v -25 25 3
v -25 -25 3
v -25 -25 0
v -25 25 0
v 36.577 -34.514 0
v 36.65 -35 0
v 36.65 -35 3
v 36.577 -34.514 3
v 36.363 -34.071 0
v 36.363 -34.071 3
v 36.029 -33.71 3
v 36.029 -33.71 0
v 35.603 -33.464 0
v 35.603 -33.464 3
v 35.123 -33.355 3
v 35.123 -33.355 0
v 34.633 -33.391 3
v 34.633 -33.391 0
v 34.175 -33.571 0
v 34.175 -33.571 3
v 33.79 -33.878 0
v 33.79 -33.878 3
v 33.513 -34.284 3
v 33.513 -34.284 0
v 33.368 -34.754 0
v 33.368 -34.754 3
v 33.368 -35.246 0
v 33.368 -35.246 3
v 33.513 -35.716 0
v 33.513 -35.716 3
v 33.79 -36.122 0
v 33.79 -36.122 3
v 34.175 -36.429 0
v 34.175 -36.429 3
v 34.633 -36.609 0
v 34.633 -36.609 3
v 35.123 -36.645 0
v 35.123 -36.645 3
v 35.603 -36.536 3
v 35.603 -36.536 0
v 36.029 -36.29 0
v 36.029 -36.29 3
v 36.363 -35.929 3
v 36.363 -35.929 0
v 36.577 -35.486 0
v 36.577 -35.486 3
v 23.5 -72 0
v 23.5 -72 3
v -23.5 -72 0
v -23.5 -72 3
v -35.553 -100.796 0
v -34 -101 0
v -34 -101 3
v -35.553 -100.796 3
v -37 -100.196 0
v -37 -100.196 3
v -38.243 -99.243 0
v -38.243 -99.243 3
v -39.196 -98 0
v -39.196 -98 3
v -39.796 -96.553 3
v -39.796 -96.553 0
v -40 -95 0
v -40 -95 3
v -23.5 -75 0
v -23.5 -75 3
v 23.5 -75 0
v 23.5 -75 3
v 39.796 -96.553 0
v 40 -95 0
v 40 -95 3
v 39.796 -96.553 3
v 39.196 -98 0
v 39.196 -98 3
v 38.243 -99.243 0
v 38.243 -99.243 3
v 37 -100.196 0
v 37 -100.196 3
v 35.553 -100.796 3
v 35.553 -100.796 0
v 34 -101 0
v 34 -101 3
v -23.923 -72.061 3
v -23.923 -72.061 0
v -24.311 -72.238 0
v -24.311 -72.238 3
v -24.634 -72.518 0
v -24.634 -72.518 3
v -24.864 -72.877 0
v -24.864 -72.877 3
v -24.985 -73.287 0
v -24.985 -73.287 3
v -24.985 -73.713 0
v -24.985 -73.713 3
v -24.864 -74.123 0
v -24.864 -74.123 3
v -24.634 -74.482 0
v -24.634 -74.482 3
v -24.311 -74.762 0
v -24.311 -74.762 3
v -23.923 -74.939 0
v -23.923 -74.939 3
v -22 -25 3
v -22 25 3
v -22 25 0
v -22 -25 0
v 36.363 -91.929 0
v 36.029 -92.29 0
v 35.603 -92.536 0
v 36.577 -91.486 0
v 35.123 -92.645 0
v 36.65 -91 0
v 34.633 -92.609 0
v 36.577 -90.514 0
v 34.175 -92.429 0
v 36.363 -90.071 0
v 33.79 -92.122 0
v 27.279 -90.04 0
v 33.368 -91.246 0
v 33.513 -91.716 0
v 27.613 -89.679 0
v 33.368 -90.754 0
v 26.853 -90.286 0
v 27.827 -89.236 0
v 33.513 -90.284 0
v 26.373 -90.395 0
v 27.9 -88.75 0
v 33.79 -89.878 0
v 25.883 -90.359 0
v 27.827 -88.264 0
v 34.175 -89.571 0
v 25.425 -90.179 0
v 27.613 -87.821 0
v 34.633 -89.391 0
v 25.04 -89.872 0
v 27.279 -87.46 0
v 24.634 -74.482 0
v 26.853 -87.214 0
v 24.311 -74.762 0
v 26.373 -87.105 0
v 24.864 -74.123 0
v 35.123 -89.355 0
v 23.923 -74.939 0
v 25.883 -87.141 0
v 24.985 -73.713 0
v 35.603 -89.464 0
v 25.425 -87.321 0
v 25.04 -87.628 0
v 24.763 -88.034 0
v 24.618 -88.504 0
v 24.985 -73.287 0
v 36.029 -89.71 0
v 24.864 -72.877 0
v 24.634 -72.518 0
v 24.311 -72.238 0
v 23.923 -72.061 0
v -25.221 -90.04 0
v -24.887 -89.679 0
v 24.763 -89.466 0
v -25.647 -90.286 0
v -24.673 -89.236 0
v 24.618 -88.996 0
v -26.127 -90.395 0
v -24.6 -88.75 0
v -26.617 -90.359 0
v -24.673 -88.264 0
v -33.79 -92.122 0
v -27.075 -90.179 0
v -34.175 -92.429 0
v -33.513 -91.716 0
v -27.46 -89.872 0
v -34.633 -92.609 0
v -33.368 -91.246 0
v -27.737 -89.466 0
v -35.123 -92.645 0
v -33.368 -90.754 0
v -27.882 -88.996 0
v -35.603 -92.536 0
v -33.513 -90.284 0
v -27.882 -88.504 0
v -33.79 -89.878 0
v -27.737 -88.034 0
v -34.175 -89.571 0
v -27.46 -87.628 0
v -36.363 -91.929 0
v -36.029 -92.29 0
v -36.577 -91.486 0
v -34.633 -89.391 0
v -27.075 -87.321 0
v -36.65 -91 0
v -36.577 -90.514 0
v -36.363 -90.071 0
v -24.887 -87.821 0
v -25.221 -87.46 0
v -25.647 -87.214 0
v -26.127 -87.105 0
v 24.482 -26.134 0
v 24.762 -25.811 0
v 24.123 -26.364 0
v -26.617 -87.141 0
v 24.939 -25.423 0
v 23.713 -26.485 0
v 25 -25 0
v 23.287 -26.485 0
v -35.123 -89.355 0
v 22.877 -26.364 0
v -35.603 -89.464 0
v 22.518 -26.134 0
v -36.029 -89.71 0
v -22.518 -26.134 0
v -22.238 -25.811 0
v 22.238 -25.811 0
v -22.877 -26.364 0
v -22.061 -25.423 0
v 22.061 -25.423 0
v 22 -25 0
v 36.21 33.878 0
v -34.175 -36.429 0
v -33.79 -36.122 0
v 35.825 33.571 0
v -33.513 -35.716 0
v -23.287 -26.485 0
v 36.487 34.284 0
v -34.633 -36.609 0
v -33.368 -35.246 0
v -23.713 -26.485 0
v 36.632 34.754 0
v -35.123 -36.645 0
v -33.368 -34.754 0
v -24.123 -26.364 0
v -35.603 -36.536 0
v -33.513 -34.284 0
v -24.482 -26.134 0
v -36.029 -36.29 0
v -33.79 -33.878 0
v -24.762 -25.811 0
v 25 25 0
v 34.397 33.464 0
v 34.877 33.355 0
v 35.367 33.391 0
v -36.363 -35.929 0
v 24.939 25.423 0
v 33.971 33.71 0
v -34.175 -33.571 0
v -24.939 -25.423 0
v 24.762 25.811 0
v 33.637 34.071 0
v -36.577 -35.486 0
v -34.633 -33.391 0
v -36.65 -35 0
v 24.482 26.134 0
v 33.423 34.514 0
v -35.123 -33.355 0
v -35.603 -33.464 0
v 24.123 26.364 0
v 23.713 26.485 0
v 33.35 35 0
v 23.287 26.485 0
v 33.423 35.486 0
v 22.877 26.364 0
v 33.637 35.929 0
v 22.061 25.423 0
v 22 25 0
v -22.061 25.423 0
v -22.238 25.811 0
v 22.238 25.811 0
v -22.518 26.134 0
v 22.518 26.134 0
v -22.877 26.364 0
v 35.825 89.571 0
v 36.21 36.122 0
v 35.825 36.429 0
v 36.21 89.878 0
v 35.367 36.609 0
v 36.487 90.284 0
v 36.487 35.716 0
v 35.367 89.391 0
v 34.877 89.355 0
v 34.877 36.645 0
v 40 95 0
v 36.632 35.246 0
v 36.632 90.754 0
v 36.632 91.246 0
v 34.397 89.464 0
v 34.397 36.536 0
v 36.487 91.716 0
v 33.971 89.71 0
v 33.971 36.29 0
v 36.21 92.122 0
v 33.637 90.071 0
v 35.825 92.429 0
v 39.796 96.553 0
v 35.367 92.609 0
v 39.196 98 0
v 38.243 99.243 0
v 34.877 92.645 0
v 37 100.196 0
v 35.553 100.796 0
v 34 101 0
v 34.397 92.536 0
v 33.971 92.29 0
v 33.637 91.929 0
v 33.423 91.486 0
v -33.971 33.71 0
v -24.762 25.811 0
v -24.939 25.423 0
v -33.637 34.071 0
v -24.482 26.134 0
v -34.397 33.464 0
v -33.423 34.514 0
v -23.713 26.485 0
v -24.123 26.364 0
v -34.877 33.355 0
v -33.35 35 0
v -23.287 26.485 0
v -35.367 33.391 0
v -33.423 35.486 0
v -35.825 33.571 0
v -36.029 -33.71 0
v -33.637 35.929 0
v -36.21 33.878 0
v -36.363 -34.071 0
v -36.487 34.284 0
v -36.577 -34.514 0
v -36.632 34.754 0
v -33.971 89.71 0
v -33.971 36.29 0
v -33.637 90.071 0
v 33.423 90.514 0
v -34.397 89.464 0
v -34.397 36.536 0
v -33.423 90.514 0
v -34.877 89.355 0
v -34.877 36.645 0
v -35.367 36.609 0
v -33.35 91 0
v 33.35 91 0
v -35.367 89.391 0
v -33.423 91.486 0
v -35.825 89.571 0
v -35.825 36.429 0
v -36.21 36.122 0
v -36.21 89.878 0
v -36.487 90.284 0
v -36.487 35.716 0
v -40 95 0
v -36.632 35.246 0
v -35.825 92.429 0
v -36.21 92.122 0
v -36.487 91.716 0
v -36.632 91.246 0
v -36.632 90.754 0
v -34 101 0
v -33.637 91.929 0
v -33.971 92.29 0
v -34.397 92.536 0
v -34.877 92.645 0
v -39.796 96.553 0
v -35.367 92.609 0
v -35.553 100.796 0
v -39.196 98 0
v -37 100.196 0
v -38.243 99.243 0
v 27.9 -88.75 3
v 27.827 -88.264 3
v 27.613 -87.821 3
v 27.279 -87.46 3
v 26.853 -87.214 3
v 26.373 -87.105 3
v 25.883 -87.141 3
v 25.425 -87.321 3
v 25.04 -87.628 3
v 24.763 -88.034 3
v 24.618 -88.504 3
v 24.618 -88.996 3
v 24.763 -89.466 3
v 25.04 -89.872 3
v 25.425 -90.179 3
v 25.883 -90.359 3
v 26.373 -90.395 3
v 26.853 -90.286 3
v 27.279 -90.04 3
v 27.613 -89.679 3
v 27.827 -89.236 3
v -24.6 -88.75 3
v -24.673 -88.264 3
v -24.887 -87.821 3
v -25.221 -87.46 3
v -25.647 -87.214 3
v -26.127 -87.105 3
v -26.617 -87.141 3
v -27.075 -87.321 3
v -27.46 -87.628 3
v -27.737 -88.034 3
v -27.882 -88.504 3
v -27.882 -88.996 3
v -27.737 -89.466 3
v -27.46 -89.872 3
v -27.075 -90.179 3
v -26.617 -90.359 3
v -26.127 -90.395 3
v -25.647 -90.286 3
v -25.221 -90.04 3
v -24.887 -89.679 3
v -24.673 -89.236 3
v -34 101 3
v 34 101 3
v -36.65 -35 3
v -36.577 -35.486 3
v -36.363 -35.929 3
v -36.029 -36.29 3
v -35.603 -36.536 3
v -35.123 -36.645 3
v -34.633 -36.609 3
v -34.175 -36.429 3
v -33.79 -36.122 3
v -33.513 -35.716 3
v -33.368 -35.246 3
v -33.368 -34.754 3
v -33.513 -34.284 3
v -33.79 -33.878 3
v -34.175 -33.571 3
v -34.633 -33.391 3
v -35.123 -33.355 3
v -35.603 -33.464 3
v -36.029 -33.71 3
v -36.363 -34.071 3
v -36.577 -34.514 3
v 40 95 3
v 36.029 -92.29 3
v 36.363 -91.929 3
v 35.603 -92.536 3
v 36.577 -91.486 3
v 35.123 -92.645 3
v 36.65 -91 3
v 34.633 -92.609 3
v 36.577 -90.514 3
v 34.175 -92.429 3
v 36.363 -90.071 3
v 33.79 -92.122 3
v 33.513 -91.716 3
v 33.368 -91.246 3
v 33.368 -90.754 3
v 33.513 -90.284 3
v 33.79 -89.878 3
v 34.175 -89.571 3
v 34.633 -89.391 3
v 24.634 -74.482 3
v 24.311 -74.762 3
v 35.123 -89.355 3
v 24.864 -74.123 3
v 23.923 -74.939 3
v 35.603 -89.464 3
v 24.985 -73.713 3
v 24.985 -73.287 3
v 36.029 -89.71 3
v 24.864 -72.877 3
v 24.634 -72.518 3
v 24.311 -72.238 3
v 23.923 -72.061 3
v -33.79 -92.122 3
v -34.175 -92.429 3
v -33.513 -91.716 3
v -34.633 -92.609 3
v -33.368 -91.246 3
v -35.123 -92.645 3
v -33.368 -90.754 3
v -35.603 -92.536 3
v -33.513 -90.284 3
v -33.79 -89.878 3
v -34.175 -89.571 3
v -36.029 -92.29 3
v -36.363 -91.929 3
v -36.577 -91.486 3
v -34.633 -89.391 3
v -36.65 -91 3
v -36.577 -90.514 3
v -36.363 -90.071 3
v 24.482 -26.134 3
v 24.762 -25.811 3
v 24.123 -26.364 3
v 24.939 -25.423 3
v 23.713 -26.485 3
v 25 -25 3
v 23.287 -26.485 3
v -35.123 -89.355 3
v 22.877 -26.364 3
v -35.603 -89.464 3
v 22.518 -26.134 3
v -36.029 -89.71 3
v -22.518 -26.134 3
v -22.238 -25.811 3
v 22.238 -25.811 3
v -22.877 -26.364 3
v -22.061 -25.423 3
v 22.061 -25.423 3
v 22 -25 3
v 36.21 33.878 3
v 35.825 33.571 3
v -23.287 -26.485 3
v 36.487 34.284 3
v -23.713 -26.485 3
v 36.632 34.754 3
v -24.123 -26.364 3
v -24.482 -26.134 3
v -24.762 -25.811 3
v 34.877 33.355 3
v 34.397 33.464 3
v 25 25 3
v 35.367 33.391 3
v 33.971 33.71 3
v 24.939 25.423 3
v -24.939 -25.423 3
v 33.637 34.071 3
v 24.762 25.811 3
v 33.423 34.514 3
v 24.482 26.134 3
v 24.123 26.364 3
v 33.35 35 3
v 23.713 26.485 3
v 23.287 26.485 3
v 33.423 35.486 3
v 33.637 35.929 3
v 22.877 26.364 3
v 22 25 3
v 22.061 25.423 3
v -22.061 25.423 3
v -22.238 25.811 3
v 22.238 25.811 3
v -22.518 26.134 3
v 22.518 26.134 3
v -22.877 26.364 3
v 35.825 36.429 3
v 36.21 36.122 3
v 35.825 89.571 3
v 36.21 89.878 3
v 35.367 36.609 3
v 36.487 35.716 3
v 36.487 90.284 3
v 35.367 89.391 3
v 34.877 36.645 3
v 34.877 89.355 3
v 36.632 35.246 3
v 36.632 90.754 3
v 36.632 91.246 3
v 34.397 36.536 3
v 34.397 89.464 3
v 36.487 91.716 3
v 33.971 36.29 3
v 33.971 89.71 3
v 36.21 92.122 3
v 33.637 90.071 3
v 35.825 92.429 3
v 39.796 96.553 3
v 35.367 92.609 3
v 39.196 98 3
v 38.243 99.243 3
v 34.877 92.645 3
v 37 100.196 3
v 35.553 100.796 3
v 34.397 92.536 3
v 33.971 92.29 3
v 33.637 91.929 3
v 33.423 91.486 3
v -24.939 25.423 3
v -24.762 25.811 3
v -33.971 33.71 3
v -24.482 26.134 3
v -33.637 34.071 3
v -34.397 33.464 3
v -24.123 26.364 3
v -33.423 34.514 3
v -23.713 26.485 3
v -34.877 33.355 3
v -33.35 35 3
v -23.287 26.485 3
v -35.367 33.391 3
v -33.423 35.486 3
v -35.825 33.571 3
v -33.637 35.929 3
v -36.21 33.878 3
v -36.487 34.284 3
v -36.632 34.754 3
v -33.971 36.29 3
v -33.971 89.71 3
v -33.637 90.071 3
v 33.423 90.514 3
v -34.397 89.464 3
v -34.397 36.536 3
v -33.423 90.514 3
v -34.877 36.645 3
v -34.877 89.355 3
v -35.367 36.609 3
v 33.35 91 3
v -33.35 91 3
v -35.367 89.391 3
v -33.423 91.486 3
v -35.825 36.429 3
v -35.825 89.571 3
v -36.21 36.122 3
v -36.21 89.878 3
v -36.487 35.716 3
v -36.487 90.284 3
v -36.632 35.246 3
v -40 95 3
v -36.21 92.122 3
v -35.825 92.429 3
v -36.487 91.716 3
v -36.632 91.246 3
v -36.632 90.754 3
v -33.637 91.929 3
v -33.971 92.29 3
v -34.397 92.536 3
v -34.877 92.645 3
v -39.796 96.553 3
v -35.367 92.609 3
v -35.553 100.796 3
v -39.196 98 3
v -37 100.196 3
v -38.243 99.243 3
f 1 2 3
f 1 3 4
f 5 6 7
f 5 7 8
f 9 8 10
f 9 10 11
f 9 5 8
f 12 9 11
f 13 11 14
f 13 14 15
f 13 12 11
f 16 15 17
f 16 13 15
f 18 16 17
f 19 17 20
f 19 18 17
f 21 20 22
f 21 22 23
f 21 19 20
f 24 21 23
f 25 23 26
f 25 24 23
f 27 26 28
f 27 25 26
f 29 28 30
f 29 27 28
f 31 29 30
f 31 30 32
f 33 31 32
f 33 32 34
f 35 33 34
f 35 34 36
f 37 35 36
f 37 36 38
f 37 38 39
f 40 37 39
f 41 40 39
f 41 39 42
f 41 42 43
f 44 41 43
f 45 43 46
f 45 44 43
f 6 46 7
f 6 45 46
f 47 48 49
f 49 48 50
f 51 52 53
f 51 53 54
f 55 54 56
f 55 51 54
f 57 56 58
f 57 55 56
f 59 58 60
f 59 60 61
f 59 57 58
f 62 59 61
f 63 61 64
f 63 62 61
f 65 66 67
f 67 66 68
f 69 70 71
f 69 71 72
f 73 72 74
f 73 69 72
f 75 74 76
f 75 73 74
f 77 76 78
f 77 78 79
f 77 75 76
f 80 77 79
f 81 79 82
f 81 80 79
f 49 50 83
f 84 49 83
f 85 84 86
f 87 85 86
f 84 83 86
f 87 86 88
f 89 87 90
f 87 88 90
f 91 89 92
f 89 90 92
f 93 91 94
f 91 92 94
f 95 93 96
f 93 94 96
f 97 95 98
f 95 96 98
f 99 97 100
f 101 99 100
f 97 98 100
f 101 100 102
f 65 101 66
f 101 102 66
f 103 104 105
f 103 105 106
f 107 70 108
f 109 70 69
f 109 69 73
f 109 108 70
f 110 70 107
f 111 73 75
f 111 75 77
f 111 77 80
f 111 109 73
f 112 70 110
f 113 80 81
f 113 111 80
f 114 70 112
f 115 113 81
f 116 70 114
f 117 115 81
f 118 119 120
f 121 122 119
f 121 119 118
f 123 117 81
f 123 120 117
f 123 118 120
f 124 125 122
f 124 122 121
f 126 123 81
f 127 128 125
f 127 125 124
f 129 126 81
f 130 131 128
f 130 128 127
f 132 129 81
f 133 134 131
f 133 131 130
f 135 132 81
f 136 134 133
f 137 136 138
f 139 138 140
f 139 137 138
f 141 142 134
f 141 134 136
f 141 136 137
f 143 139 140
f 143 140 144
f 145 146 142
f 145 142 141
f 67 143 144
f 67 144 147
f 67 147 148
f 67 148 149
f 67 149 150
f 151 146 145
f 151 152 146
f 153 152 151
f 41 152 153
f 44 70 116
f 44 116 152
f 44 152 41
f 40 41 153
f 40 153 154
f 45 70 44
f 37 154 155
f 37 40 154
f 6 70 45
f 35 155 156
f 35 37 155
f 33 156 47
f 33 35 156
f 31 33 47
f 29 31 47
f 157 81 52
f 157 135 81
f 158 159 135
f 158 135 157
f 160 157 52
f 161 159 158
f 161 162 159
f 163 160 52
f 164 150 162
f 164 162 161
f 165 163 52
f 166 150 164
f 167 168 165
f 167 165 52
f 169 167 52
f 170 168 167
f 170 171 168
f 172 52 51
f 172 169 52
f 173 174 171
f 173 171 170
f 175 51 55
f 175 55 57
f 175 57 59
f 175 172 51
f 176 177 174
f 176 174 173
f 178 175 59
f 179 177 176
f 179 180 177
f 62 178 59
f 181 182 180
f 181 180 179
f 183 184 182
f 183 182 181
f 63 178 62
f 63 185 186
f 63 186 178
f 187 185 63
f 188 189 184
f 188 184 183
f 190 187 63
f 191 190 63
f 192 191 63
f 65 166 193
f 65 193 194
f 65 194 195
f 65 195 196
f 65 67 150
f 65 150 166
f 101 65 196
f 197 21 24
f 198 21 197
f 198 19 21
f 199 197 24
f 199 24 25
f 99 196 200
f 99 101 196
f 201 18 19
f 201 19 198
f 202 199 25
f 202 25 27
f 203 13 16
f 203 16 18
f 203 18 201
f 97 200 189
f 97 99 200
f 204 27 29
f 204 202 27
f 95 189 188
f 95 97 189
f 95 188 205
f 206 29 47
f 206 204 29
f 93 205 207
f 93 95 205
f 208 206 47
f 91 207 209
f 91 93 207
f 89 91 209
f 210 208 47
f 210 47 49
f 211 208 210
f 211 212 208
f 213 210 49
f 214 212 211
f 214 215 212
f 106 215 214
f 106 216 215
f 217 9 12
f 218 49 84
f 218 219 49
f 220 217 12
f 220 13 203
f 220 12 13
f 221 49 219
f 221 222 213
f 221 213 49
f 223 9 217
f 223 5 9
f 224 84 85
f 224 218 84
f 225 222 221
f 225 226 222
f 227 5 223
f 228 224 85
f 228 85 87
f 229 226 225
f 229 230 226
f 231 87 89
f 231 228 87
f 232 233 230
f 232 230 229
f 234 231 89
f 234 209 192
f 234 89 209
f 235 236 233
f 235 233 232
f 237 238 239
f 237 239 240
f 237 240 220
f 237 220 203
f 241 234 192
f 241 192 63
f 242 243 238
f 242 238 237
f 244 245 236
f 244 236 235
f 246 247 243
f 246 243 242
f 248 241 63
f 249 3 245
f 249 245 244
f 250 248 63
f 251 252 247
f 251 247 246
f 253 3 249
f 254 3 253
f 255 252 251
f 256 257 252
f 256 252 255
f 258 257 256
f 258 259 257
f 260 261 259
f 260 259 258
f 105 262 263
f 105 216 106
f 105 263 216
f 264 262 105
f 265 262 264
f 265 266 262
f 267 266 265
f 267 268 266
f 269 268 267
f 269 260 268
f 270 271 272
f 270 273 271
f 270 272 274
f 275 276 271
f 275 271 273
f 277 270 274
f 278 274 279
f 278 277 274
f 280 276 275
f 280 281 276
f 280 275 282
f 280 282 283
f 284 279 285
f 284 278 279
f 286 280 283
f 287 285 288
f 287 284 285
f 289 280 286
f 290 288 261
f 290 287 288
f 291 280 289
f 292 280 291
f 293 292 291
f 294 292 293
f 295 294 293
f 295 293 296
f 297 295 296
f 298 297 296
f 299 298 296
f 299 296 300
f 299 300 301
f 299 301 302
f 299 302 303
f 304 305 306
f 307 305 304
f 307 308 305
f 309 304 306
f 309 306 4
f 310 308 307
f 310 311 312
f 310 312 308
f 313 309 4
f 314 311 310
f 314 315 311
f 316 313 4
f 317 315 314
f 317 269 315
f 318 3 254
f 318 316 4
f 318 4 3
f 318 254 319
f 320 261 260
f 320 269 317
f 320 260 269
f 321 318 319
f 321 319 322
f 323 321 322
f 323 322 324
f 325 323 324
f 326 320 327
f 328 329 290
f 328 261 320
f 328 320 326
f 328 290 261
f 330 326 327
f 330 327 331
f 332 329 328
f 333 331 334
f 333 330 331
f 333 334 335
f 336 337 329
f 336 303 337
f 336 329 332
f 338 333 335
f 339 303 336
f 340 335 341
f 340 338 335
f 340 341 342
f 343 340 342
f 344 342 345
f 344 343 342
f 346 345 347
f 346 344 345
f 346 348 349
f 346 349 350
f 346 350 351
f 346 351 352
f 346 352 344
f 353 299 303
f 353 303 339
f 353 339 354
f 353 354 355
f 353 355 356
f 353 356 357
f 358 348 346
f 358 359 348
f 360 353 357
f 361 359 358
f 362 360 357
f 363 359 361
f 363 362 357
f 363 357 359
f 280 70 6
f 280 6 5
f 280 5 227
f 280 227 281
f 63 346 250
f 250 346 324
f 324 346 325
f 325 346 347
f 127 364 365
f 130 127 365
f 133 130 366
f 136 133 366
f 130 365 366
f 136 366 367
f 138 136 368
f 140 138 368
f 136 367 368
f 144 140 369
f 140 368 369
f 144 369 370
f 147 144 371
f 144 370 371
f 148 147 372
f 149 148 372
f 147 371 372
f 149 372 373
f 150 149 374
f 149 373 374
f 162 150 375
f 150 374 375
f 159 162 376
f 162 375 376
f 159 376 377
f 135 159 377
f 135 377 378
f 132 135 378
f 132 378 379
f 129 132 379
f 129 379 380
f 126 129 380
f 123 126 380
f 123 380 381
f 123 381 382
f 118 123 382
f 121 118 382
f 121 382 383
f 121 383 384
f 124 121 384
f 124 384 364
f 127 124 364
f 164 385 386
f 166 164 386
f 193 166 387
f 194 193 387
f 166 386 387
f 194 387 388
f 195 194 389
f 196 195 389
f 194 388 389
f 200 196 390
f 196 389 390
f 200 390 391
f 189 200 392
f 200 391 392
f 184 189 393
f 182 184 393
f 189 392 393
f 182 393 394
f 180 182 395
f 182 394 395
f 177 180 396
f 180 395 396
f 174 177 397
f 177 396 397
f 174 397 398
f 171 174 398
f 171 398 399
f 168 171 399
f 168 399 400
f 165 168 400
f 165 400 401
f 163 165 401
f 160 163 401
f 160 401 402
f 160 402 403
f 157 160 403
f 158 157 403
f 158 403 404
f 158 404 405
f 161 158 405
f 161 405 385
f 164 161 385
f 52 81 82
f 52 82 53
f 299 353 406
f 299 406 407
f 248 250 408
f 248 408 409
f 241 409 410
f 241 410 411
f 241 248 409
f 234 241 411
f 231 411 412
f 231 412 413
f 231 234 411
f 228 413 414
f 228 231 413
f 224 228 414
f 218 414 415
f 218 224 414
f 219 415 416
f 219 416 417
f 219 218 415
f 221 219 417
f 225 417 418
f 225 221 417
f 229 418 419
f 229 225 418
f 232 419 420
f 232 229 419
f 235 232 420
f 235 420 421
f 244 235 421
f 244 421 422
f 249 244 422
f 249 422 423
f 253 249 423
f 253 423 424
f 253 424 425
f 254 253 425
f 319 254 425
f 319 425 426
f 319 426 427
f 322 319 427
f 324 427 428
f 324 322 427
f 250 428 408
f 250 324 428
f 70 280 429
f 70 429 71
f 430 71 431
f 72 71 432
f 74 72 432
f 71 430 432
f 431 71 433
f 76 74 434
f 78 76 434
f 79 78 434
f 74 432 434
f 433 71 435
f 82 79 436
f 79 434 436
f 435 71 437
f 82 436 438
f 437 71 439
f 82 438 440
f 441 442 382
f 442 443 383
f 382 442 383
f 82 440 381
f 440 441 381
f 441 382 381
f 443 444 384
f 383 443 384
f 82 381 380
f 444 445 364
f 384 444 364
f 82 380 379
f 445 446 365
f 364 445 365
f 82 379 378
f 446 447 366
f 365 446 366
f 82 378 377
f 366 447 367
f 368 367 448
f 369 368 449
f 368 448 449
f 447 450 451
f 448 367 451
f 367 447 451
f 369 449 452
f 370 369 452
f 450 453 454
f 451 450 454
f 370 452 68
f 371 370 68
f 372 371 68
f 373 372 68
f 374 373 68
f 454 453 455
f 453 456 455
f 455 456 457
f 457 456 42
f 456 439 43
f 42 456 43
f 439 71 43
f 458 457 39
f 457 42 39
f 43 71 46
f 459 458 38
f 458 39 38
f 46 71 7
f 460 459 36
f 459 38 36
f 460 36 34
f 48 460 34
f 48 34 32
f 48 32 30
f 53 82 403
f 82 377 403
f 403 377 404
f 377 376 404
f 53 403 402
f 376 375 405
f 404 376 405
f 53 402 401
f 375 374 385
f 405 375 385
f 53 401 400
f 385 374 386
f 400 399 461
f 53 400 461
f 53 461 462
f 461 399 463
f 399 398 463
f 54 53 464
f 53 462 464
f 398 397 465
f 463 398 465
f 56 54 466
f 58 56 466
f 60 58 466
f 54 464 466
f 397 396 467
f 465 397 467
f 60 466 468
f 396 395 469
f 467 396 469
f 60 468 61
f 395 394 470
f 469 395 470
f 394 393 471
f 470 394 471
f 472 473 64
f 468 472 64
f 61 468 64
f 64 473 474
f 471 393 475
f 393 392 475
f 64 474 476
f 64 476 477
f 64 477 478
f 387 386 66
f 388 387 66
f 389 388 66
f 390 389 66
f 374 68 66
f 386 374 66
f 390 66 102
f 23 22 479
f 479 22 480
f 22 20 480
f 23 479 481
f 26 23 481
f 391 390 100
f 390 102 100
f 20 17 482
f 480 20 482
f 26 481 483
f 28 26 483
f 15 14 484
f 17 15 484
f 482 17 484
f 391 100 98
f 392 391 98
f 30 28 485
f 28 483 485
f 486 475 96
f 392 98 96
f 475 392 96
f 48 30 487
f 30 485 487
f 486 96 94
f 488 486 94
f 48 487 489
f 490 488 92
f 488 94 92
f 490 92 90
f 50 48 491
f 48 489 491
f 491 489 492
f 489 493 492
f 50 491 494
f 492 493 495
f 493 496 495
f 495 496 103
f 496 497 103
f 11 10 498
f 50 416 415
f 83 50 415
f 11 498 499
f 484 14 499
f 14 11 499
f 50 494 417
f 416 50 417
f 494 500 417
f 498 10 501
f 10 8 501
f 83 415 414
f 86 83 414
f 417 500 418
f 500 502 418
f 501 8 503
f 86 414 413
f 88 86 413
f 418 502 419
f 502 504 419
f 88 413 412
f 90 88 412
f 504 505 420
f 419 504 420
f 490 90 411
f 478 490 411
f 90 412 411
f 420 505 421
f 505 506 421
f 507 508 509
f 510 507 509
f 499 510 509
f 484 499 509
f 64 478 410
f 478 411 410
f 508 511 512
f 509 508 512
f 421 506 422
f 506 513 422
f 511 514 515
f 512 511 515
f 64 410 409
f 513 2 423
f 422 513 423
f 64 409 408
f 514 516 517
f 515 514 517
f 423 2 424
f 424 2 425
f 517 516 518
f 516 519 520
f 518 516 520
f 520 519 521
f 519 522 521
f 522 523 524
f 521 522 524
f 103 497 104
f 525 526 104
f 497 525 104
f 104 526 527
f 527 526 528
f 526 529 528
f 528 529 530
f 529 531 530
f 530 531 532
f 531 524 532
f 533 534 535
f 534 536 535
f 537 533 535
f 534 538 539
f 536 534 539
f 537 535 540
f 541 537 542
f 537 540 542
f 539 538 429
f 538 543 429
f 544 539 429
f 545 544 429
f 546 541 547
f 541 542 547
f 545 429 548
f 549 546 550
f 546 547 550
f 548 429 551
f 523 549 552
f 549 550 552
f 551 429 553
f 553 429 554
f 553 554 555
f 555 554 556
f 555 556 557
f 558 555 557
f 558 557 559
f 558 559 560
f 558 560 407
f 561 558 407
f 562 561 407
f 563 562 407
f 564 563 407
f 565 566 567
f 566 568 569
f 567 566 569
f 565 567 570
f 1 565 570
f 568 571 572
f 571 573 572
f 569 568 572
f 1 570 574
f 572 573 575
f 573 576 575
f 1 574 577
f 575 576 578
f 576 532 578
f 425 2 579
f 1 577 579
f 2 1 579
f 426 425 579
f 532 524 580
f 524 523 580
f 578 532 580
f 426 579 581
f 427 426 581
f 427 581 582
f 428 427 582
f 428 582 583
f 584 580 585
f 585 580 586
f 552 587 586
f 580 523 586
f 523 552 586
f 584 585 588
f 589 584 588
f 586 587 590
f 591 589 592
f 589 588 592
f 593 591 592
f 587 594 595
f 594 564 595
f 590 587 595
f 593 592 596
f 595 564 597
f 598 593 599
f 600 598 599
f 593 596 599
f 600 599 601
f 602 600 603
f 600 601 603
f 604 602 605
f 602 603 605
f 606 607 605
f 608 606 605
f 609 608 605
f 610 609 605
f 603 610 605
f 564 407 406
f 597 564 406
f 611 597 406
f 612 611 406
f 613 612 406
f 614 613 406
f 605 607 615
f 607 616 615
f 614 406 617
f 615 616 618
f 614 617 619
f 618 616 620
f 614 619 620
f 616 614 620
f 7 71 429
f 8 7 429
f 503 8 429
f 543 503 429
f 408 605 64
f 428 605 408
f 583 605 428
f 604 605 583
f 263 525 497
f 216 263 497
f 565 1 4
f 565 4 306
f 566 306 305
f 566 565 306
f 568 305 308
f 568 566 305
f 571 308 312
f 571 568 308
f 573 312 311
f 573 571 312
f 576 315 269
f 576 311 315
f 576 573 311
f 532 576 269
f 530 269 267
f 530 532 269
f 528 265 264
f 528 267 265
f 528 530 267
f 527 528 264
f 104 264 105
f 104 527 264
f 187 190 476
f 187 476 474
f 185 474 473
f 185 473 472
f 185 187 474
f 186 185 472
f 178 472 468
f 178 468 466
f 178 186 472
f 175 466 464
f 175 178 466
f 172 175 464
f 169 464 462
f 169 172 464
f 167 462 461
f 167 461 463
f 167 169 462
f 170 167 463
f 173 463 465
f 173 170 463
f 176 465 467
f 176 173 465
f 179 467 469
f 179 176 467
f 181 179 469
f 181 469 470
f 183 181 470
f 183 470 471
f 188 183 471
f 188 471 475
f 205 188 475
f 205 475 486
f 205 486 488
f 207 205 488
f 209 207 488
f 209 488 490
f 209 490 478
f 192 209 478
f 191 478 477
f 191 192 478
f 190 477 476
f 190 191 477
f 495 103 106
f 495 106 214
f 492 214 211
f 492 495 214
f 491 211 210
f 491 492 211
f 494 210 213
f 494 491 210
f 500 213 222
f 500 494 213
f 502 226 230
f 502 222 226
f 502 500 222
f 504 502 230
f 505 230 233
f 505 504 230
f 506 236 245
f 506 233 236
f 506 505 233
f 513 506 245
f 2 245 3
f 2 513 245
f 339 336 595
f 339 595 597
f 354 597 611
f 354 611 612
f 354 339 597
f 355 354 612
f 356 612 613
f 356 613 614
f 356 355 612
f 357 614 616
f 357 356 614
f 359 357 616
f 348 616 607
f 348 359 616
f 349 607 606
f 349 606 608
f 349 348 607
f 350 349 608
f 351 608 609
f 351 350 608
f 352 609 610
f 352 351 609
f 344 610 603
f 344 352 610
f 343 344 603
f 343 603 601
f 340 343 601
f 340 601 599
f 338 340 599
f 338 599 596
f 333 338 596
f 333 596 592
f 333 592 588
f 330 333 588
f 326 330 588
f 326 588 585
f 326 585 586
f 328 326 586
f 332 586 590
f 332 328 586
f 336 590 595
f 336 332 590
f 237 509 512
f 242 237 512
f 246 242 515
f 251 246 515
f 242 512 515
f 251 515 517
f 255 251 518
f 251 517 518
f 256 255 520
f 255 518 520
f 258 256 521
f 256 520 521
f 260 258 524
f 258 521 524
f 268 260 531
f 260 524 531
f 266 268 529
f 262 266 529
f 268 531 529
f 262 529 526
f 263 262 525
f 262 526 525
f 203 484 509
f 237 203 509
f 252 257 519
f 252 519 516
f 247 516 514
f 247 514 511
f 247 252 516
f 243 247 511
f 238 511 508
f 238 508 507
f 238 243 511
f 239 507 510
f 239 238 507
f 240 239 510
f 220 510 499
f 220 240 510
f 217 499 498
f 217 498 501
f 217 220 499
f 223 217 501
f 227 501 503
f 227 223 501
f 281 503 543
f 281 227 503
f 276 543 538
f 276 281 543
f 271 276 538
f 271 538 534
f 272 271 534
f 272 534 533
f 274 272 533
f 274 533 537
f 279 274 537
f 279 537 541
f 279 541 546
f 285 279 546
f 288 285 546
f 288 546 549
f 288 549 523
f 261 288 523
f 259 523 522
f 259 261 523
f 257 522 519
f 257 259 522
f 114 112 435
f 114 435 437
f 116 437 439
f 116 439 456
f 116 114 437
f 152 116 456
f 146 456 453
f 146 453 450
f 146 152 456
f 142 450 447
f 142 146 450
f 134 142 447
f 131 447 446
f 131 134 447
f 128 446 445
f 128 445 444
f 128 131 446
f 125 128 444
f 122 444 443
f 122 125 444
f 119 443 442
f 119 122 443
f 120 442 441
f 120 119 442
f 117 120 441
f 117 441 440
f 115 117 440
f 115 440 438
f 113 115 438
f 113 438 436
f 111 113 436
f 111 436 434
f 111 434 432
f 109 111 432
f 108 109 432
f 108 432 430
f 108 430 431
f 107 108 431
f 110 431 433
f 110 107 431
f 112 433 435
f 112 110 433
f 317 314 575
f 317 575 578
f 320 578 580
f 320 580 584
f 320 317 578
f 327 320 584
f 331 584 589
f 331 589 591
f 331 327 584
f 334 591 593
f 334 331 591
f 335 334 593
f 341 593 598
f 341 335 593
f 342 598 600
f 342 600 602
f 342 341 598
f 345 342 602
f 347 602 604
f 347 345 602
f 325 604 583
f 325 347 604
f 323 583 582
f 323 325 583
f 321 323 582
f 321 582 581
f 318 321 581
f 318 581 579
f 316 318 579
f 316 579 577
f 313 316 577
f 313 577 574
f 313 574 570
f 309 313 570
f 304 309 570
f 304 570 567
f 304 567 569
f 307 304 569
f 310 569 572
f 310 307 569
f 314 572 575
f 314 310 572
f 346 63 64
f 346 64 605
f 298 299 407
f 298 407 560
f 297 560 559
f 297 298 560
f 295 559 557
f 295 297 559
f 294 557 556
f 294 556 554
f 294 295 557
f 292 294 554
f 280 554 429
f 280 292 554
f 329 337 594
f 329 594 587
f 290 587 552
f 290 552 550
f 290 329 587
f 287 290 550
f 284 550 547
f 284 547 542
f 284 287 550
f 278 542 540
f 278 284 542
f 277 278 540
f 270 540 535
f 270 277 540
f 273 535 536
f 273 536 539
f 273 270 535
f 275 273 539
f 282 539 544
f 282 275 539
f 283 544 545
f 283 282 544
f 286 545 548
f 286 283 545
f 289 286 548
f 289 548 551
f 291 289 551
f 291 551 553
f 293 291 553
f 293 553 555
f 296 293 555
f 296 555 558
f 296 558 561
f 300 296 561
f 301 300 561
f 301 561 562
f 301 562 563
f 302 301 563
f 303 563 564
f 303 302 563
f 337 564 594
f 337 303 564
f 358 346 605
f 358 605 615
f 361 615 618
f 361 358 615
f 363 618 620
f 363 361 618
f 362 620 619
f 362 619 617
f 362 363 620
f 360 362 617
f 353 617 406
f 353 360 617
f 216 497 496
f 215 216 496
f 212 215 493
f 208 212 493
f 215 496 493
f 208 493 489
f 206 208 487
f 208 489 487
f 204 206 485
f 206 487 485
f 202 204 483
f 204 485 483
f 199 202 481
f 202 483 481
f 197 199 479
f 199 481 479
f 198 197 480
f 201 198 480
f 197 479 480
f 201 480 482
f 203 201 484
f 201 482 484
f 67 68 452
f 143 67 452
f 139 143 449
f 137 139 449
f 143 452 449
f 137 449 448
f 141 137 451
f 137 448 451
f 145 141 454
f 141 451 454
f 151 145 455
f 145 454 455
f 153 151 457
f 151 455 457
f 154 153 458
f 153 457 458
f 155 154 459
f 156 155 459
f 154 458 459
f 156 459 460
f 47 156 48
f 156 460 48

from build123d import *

# Parameters (mm, degrees)
SKETCH_1_R          = 1.65
EXTRUDE_1_DEPTH     = 3
SKETCH_2_R          = 1.65
CUT_EXTRUDE_1_DEPTH = 109.673823895


with BuildPart() as part:
    # Эскиз1 → Бобышка-Вытянуть1 (new body)
    with BuildSketch(Plane.XY):
        with BuildLine():
            Line((-34, 101), (34, 101))
            ThreePointArc((34, 101), (38.242640687, 99.242640687), (40, 95))
            Line((40, 95), (40, -95))
            ThreePointArc((40, -95), (38.242640687, -99.242640687), (34, -101))
            Line((34, -101), (-34, -101))
            ThreePointArc((-34, -101), (-38.242640687, -99.242640687), (-40, -95))
            Line((-40, -95), (-40, 95))
            ThreePointArc((-40, 95), (-38.242640687, 99.242640687), (-34, 101))
        make_face()
        with Locations((-35, 91)):
            Circle(SKETCH_1_R, mode=Mode.SUBTRACT)
        with Locations((-35, 35)):
            Circle(SKETCH_1_R, mode=Mode.SUBTRACT)
        with Locations(Location((35, 35, 0), (0, 0, 180))):
            Circle(SKETCH_1_R, mode=Mode.SUBTRACT)
        with Locations(Location((35, 91, 0), (0, 0, 180))):
            Circle(SKETCH_1_R, mode=Mode.SUBTRACT)
        with Locations((35, -91)):
            Circle(SKETCH_1_R, mode=Mode.SUBTRACT)
        with Locations(Location((-35, -91, 0), (0, 0, 180))):
            Circle(SKETCH_1_R, mode=Mode.SUBTRACT)
        with Locations(Location((-35, -35, 0), (0, 0, 180))):
            Circle(SKETCH_1_R, mode=Mode.SUBTRACT)
        with Locations((35, -35)):
            Circle(SKETCH_1_R, mode=Mode.SUBTRACT)
    extrude(amount=EXTRUDE_1_DEPTH)

    # Эскиз2 → Вырез-Вытянуть1 (cut, through all)
    with BuildSketch(Plane.XY.offset(3)):
        with Locations((-26.25, -88.75)):
            Circle(SKETCH_2_R)
        with Locations((26.25, -88.75)):
            Circle(SKETCH_2_R)
        with BuildLine():
            Line((-22, 25), (-22, -25))
            ThreePointArc((-22, -25), (-23.5, -26.5), (-25, -25))
            Line((-25, -25), (-25, 25))
            ThreePointArc((-25, 25), (-23.5, 26.5), (-22, 25))
        make_face()
        with BuildLine():
            Line((22, 25), (22, -25))
            ThreePointArc((22, -25), (23.5, -26.5), (25, -25))
            Line((25, -25), (25, 25))
            ThreePointArc((25, 25), (23.5, 26.5), (22, 25))
        make_face()
        with BuildLine():
            Line((-23.5, -75), (23.5, -75))
            ThreePointArc((23.5, -75), (25, -73.5), (23.5, -72))
            Line((23.5, -72), (-23.5, -72))
            ThreePointArc((-23.5, -72), (-25, -73.5), (-23.5, -75))
        make_face()
    extrude(amount=-CUT_EXTRUDE_1_DEPTH, mode=Mode.SUBTRACT)


solid = part.part
